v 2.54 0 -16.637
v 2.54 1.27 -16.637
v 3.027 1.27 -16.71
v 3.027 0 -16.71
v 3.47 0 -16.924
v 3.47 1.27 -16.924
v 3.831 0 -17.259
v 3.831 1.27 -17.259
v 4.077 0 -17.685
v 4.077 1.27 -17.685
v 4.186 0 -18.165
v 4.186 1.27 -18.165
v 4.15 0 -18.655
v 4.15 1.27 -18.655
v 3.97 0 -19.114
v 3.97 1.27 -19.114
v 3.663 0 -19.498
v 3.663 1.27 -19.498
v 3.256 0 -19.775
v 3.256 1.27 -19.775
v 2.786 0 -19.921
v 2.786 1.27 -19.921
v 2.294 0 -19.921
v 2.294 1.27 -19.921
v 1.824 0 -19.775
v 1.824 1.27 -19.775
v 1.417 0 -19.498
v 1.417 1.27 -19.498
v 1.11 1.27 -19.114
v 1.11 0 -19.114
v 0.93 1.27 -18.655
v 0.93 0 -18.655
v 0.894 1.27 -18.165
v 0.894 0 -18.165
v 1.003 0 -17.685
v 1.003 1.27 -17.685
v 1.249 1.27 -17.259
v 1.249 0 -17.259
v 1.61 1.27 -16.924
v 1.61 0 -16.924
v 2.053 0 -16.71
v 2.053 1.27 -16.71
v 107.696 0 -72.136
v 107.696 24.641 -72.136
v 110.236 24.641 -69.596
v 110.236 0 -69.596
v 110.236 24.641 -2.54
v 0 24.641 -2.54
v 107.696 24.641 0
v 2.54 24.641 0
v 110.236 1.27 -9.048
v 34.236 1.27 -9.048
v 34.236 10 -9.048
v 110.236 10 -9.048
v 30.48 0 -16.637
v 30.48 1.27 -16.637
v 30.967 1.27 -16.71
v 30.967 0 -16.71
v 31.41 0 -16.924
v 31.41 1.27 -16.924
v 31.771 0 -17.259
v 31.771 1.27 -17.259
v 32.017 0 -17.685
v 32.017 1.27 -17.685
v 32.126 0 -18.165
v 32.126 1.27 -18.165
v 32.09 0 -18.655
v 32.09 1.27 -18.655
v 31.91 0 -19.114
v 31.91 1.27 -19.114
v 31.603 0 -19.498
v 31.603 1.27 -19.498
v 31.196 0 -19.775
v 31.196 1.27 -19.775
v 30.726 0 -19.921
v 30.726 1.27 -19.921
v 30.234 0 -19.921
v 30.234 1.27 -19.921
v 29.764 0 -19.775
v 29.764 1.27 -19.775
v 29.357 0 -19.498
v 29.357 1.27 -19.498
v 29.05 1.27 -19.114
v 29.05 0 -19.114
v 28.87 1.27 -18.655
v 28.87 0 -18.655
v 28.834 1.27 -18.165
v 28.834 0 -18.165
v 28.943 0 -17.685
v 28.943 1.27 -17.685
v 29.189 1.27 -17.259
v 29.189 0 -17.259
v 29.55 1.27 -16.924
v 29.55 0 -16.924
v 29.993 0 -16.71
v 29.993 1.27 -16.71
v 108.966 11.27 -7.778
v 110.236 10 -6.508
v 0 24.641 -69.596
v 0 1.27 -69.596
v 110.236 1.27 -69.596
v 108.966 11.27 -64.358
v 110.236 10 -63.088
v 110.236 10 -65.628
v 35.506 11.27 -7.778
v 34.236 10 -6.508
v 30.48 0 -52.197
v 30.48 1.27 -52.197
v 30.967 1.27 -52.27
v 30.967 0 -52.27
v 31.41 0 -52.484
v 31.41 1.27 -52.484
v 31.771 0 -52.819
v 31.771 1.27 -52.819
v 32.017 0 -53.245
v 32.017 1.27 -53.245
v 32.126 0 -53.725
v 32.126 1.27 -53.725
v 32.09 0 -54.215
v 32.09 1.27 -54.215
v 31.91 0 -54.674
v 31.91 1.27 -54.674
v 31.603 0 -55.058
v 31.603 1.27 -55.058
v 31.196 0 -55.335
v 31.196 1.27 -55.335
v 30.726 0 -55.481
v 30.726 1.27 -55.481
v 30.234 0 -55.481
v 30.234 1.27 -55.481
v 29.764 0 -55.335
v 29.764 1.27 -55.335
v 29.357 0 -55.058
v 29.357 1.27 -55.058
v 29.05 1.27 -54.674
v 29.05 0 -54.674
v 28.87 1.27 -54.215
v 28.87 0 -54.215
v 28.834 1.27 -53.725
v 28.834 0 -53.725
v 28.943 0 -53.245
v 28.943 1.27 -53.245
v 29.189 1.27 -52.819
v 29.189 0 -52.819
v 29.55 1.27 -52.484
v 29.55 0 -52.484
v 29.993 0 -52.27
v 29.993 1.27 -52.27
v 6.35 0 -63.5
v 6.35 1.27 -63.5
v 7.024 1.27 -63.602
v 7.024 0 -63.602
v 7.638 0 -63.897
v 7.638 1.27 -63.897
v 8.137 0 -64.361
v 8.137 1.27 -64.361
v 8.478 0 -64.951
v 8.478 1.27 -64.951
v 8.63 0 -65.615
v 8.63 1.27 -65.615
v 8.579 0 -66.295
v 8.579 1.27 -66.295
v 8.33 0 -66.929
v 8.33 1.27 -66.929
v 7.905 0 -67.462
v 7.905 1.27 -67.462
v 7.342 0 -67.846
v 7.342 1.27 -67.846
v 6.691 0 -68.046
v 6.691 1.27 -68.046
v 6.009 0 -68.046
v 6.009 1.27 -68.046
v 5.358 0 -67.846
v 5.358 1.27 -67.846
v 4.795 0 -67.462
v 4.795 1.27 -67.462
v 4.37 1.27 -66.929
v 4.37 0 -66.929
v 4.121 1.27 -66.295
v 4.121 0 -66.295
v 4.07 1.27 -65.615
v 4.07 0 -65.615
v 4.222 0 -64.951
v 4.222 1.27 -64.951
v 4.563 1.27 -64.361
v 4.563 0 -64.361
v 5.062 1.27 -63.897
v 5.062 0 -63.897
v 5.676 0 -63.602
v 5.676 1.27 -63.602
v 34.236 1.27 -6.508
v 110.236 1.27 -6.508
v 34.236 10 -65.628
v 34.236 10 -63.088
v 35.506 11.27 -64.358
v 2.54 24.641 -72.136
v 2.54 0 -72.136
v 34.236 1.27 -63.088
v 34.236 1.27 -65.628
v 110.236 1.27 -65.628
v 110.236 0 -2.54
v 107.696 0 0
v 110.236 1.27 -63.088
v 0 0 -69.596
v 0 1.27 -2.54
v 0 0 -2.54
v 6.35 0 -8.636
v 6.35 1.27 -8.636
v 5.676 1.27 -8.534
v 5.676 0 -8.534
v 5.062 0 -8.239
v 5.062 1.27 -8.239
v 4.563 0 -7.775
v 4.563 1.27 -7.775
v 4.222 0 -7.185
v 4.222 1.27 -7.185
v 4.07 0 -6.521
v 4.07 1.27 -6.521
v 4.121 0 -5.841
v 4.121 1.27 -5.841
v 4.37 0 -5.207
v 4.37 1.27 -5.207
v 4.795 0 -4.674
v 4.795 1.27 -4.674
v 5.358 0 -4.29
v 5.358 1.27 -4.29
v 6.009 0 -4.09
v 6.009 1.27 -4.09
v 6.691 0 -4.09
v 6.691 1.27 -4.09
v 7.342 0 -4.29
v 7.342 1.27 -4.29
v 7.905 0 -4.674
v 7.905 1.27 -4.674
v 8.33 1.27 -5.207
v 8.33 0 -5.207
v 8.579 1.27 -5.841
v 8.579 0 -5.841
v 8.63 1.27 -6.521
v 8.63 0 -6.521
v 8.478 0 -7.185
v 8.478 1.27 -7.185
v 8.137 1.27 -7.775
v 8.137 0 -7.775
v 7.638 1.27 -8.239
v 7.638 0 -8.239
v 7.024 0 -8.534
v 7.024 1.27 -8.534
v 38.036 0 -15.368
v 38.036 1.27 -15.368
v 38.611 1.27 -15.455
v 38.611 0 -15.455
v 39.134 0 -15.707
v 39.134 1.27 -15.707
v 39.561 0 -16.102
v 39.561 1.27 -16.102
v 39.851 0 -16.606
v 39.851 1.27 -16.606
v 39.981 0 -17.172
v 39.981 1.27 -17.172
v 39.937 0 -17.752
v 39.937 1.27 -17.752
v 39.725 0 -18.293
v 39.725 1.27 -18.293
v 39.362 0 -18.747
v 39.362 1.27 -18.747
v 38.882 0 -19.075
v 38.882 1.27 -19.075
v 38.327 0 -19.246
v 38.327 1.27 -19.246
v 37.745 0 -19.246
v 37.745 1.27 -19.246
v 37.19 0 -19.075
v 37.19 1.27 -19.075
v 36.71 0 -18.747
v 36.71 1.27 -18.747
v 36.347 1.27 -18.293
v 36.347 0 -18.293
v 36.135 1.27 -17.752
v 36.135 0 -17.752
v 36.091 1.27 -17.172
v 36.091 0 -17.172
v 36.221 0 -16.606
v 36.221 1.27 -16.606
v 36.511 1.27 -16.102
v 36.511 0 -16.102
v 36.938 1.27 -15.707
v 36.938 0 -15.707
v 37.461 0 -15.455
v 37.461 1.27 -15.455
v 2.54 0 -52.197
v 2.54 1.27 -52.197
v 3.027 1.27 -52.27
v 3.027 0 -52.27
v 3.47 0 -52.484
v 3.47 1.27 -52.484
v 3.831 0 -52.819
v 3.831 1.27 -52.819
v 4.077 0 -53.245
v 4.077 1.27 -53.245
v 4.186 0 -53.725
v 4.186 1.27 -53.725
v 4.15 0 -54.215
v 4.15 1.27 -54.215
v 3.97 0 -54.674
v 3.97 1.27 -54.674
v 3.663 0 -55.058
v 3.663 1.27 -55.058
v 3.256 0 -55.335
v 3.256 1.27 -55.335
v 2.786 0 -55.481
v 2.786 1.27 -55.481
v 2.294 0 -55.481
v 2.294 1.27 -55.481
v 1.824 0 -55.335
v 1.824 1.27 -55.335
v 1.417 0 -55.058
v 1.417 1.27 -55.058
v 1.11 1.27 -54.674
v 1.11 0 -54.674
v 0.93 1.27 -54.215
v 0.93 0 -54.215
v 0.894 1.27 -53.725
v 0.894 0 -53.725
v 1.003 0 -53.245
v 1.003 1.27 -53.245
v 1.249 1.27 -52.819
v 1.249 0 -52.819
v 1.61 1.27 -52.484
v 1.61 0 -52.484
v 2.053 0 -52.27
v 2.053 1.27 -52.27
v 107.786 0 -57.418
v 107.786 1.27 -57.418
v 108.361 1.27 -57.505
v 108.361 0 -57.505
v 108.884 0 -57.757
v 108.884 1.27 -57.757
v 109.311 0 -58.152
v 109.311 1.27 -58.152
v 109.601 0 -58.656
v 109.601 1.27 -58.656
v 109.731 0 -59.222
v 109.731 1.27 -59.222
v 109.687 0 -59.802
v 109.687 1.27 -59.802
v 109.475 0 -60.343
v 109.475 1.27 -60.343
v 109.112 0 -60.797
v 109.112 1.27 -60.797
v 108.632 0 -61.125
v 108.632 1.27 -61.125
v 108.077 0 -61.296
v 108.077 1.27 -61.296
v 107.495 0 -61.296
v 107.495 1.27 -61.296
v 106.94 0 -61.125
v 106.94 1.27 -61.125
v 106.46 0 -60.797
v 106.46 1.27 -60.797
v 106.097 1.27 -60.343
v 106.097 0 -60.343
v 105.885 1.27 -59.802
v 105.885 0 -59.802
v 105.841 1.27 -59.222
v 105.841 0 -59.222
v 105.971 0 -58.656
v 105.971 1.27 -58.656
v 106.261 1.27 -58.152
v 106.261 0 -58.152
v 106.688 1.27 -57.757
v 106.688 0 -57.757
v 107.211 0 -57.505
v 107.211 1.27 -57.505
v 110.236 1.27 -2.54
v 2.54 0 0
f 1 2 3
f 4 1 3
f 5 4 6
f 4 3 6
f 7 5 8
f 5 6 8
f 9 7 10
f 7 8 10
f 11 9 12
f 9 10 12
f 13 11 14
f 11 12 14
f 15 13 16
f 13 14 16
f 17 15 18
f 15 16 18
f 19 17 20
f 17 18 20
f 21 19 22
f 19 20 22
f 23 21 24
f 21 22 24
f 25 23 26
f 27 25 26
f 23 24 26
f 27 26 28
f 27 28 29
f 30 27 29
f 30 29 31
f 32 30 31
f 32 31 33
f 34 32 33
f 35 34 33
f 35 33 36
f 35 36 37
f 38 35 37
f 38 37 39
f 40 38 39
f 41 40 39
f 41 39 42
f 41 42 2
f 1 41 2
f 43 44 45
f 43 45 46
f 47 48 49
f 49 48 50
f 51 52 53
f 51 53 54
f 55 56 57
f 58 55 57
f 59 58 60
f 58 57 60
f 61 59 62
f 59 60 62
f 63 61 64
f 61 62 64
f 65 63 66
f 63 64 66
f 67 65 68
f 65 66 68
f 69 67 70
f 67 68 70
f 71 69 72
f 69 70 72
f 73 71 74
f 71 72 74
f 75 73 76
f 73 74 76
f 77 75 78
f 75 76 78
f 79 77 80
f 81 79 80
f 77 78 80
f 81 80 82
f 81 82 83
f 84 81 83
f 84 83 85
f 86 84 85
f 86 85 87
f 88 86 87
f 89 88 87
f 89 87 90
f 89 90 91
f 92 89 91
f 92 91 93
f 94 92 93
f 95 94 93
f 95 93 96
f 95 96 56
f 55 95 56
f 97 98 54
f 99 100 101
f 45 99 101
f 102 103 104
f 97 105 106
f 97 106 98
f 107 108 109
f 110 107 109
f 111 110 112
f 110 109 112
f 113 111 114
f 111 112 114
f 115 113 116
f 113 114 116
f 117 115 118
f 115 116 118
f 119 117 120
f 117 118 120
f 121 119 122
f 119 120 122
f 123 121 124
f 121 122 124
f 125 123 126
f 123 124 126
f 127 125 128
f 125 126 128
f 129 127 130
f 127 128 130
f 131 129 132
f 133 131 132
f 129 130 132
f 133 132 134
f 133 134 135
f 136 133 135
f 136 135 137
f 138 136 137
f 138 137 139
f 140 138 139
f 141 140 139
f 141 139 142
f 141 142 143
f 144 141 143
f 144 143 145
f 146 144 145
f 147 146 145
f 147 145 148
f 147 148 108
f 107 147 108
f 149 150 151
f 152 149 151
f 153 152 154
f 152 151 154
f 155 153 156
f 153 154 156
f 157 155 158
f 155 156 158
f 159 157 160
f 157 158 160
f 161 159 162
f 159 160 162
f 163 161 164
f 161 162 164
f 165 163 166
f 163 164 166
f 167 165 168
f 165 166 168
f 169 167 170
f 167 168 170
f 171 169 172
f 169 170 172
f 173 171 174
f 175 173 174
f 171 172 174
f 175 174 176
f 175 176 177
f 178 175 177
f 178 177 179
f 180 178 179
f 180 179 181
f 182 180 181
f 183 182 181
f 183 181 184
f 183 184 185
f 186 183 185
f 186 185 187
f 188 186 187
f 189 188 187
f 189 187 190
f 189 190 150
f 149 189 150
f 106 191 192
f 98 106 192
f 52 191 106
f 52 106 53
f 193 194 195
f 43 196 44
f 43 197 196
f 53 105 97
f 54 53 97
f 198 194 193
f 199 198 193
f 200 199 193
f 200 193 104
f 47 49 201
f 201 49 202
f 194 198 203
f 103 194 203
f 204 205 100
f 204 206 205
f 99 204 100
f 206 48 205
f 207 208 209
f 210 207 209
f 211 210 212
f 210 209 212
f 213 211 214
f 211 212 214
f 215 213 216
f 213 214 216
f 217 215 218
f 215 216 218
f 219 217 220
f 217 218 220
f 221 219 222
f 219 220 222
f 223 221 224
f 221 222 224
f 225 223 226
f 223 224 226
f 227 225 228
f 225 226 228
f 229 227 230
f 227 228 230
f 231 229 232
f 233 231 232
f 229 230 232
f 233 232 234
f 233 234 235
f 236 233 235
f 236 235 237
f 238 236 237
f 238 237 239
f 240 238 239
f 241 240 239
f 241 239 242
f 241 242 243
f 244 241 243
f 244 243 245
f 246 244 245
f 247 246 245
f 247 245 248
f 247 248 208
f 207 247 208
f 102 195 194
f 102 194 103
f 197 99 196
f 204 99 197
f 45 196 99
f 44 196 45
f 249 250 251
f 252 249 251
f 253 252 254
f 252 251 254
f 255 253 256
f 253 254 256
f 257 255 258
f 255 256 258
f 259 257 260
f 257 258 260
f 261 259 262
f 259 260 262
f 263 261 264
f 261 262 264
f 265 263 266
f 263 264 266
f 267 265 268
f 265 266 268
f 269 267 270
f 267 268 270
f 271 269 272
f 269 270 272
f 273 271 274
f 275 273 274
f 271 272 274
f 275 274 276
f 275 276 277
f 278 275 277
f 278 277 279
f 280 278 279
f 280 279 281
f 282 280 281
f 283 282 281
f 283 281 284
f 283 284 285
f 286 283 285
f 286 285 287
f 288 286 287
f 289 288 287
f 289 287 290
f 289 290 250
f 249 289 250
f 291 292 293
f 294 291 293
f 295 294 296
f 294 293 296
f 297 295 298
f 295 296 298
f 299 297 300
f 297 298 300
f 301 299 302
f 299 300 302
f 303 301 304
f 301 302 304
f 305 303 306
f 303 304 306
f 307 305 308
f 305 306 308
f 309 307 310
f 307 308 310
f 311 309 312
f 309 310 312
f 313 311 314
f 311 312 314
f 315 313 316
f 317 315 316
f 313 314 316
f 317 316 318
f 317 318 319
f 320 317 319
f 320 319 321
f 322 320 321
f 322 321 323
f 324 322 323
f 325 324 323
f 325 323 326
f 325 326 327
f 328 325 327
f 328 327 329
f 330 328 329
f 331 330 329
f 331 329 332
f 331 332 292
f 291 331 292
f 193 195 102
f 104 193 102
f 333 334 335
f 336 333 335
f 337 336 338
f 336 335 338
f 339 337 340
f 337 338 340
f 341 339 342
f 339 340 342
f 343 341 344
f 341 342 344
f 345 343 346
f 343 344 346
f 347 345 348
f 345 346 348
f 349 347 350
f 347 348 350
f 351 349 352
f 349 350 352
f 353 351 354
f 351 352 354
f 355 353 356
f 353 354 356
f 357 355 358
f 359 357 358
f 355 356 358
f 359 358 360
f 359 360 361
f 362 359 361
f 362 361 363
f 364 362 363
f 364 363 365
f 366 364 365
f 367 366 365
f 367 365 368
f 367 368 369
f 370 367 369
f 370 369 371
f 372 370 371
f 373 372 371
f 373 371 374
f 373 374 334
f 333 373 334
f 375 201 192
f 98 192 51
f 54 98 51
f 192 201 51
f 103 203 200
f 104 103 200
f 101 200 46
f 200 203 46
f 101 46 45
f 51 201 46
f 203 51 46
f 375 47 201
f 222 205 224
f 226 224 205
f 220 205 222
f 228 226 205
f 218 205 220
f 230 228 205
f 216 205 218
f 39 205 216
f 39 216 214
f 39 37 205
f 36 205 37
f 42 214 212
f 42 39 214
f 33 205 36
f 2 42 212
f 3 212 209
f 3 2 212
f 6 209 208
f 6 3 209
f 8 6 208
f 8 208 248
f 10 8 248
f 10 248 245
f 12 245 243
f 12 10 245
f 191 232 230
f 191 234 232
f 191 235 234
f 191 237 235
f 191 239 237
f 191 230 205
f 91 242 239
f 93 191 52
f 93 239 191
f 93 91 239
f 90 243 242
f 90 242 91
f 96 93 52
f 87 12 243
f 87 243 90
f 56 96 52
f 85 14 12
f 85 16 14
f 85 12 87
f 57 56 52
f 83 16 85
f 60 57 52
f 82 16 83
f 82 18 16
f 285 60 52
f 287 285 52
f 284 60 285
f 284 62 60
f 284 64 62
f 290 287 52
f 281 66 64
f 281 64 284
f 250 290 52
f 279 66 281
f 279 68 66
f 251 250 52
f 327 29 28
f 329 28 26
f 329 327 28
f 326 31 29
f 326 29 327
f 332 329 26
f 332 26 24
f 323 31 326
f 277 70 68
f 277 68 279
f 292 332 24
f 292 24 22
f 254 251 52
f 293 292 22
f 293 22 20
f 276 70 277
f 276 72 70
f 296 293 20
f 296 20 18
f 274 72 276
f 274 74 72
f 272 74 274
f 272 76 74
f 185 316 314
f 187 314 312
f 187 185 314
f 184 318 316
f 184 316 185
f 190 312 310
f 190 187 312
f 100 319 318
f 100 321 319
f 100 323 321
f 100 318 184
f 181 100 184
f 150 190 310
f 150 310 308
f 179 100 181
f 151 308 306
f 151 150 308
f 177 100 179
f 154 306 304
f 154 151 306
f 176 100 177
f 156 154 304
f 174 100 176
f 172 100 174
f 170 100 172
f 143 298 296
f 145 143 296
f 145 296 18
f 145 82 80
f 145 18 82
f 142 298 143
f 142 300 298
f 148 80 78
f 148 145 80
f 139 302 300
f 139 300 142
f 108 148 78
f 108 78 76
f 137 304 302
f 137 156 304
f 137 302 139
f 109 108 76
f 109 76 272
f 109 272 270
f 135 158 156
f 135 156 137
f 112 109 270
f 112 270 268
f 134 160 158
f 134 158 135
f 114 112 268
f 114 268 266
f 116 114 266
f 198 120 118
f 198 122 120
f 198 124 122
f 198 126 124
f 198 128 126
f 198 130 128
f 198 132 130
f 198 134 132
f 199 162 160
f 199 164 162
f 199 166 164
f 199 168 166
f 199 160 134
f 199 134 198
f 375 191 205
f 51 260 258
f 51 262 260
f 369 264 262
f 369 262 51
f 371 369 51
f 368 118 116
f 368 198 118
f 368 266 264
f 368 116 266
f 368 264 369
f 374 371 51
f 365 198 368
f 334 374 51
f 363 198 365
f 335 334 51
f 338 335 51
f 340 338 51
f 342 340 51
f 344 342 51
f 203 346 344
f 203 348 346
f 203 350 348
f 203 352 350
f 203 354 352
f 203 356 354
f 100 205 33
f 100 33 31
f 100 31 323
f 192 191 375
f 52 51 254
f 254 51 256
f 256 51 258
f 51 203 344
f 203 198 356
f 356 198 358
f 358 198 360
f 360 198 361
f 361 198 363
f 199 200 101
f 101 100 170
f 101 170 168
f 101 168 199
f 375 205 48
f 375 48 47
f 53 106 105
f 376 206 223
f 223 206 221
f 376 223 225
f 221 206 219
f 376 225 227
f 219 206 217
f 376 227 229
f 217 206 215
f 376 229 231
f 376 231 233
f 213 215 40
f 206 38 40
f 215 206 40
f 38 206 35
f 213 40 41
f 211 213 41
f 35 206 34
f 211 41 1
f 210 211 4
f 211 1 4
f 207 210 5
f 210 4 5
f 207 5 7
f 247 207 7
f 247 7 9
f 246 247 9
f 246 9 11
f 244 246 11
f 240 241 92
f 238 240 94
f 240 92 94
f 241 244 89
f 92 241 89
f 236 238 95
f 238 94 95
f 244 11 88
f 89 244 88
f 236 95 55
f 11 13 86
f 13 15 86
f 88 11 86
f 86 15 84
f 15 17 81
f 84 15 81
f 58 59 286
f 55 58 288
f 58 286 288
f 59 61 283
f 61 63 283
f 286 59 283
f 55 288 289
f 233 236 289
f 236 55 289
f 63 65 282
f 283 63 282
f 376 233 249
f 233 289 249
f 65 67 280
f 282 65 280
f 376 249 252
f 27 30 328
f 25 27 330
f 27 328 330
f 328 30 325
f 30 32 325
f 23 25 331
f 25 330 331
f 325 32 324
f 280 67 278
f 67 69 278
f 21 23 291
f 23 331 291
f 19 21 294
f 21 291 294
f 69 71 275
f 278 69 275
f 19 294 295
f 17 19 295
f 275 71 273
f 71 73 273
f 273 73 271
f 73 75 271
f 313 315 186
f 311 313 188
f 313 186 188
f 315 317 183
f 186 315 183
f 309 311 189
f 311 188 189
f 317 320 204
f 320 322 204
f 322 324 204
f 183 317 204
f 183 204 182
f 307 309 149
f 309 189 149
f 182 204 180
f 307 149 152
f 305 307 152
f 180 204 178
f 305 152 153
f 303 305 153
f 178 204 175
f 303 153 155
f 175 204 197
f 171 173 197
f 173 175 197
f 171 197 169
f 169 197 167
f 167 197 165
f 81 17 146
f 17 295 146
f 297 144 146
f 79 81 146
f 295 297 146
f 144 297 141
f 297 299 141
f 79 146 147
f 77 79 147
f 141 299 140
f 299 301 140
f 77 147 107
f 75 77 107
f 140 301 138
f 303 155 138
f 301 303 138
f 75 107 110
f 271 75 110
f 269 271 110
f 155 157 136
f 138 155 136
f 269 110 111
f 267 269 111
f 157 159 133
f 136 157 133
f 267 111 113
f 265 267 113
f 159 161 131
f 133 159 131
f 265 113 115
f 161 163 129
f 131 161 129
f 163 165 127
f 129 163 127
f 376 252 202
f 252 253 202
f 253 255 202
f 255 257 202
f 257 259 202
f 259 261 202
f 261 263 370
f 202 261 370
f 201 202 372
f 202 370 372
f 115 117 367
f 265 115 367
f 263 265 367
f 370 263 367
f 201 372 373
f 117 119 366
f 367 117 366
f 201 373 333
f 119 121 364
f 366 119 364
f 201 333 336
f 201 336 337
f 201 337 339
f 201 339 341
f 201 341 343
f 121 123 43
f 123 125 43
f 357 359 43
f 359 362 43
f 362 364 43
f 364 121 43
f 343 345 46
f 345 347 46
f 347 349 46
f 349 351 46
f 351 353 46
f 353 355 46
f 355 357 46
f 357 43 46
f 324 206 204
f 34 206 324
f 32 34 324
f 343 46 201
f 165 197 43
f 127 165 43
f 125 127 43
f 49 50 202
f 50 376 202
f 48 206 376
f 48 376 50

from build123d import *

# Parameters (mm, degrees)
SKETCH1_W               = 110.236
SKETCH1_H               = 72.136
RADIO_MOUNT_PLATE_DEPTH = 1.27
SKETCH2_R               = 1.95
SKETCH2_R_2             = 1.651
CUT_EXTRUDE1_DEPTH      = 132.746692907
SKETCH3_W               = 110.236
SKETCH3_H               = 2.54
BOSS_EXTRUDE2_DEPTH     = 23.37054
SKETCH4_R               = 2.286
CUT_EXTRUDE2_DEPTH      = 134.79746011
SKETCH5_W               = 76
SKETCH5_H               = 2.54
BOSS_EXTRUDE3_DEPTH     = 10
CHAMFER1_SIZE           = 1.27
CHAMFER2_SIZE           = 2.54


with BuildPart() as part:
    # Sketch1 → Radio Mount Plate (new body)
    with BuildSketch(Plane(origin=(0, 0, 0), x_dir=(1, 0, 0), z_dir=(0, 1, 0))):
        with Locations((55.118, 36.068)):
            Rectangle(SKETCH1_W, SKETCH1_H)
    extrude(amount=RADIO_MOUNT_PLATE_DEPTH)

    # Sketch2 → Cut-Extrude1 (cut, through all)
    with BuildSketch(Plane(origin=(0, 1.27, 0), x_dir=(1, 0, 0), z_dir=(0, 1, 0))):
        with Locations(Location((107.786, 59.368, 0), (0, 0, 270))):
            Circle(SKETCH2_R)
        with Locations(Location((38.036, 17.318, 0), (0, 0, 270))):
            Circle(SKETCH2_R)
        with Locations(Location((2.54, 53.848, 0), (0, 0, 270))):
            Circle(SKETCH2_R_2)
        with Locations(Location((30.48, 53.848, 0), (0, 0, 270))):
            Circle(SKETCH2_R_2)
        with Locations(Location((30.48, 18.288, 0), (0, 0, 270))):
            Circle(SKETCH2_R_2)
        with Locations(Location((2.54, 18.288, 0), (0, 0, 270))):
            Circle(SKETCH2_R_2)
    extrude(amount=-CUT_EXTRUDE1_DEPTH, mode=Mode.SUBTRACT)

    # Sketch3 → Boss-Extrude2 (add)
    with BuildSketch(Plane(origin=(0, 1.27, 0), x_dir=(1, 0, 0), z_dir=(0, 1, 0))):
        with Locations((55.118, 70.866)):
            Rectangle(SKETCH3_W, SKETCH3_H)
        with Locations((55.118, 1.27)):
            Rectangle(SKETCH3_W, SKETCH3_H)
    extrude(amount=BOSS_EXTRUDE2_DEPTH)

    # Sketch4 → Cut-Extrude2 (cut, through all)
    with BuildSketch(Plane(origin=(0, 1.27, 0), x_dir=(1, 0, 0), z_dir=(0, 1, 0))):
        with Locations(Location((6.35, 65.786, 0), (0, 0, 270))):
            Circle(SKETCH4_R)
        with Locations(Location((6.35, 6.35, 0), (0, 0, 90))):
            Circle(SKETCH4_R)
    extrude(amount=-CUT_EXTRUDE2_DEPTH, mode=Mode.SUBTRACT)

    # Sketch5 → Boss-Extrude3 (add)
    with BuildSketch(Plane(origin=(0, 1.27, 0), x_dir=(1, 0, 0), z_dir=(0, 1, 0))):
        with Locations((72.236, 64.358)):
            Rectangle(SKETCH5_W, SKETCH5_H)
        with Locations((72.236, 7.778)):
            Rectangle(SKETCH5_W, SKETCH5_H)
    extrude(amount=BOSS_EXTRUDE3_DEPTH)

    # Chamfer1
    chamfer1_edges = [part.edges().sort_by_distance(p)[0] for p in [
        (34.236, 11.27, -64.358),
        (72.236, 11.27, -63.088),
        (110.236, 11.27, -64.358),
        (72.236, 11.27, -65.628),
        (34.236, 11.27, -7.778),
        (72.236, 11.27, -6.508),
        (110.236, 11.27, -7.778),
        (72.236, 11.27, -9.048),
    ]]
    chamfer(chamfer1_edges, length=CHAMFER1_SIZE - 0.0001)  # a hair under: the kernel refuses the full size

    # Chamfer2
    chamfer2_edges = [part.edges().sort_by_distance(p)[0] for p in [
        (110.236, 12.32027, 0),
        (110.236, 12.32027, -72.136),
        (0, 12.32027, -72.136),
        (0, 12.32027, 0),
    ]]
    chamfer(chamfer2_edges, length=CHAMFER2_SIZE - 0.0001)  # a hair under: the kernel refuses the full size


solid = part.part
